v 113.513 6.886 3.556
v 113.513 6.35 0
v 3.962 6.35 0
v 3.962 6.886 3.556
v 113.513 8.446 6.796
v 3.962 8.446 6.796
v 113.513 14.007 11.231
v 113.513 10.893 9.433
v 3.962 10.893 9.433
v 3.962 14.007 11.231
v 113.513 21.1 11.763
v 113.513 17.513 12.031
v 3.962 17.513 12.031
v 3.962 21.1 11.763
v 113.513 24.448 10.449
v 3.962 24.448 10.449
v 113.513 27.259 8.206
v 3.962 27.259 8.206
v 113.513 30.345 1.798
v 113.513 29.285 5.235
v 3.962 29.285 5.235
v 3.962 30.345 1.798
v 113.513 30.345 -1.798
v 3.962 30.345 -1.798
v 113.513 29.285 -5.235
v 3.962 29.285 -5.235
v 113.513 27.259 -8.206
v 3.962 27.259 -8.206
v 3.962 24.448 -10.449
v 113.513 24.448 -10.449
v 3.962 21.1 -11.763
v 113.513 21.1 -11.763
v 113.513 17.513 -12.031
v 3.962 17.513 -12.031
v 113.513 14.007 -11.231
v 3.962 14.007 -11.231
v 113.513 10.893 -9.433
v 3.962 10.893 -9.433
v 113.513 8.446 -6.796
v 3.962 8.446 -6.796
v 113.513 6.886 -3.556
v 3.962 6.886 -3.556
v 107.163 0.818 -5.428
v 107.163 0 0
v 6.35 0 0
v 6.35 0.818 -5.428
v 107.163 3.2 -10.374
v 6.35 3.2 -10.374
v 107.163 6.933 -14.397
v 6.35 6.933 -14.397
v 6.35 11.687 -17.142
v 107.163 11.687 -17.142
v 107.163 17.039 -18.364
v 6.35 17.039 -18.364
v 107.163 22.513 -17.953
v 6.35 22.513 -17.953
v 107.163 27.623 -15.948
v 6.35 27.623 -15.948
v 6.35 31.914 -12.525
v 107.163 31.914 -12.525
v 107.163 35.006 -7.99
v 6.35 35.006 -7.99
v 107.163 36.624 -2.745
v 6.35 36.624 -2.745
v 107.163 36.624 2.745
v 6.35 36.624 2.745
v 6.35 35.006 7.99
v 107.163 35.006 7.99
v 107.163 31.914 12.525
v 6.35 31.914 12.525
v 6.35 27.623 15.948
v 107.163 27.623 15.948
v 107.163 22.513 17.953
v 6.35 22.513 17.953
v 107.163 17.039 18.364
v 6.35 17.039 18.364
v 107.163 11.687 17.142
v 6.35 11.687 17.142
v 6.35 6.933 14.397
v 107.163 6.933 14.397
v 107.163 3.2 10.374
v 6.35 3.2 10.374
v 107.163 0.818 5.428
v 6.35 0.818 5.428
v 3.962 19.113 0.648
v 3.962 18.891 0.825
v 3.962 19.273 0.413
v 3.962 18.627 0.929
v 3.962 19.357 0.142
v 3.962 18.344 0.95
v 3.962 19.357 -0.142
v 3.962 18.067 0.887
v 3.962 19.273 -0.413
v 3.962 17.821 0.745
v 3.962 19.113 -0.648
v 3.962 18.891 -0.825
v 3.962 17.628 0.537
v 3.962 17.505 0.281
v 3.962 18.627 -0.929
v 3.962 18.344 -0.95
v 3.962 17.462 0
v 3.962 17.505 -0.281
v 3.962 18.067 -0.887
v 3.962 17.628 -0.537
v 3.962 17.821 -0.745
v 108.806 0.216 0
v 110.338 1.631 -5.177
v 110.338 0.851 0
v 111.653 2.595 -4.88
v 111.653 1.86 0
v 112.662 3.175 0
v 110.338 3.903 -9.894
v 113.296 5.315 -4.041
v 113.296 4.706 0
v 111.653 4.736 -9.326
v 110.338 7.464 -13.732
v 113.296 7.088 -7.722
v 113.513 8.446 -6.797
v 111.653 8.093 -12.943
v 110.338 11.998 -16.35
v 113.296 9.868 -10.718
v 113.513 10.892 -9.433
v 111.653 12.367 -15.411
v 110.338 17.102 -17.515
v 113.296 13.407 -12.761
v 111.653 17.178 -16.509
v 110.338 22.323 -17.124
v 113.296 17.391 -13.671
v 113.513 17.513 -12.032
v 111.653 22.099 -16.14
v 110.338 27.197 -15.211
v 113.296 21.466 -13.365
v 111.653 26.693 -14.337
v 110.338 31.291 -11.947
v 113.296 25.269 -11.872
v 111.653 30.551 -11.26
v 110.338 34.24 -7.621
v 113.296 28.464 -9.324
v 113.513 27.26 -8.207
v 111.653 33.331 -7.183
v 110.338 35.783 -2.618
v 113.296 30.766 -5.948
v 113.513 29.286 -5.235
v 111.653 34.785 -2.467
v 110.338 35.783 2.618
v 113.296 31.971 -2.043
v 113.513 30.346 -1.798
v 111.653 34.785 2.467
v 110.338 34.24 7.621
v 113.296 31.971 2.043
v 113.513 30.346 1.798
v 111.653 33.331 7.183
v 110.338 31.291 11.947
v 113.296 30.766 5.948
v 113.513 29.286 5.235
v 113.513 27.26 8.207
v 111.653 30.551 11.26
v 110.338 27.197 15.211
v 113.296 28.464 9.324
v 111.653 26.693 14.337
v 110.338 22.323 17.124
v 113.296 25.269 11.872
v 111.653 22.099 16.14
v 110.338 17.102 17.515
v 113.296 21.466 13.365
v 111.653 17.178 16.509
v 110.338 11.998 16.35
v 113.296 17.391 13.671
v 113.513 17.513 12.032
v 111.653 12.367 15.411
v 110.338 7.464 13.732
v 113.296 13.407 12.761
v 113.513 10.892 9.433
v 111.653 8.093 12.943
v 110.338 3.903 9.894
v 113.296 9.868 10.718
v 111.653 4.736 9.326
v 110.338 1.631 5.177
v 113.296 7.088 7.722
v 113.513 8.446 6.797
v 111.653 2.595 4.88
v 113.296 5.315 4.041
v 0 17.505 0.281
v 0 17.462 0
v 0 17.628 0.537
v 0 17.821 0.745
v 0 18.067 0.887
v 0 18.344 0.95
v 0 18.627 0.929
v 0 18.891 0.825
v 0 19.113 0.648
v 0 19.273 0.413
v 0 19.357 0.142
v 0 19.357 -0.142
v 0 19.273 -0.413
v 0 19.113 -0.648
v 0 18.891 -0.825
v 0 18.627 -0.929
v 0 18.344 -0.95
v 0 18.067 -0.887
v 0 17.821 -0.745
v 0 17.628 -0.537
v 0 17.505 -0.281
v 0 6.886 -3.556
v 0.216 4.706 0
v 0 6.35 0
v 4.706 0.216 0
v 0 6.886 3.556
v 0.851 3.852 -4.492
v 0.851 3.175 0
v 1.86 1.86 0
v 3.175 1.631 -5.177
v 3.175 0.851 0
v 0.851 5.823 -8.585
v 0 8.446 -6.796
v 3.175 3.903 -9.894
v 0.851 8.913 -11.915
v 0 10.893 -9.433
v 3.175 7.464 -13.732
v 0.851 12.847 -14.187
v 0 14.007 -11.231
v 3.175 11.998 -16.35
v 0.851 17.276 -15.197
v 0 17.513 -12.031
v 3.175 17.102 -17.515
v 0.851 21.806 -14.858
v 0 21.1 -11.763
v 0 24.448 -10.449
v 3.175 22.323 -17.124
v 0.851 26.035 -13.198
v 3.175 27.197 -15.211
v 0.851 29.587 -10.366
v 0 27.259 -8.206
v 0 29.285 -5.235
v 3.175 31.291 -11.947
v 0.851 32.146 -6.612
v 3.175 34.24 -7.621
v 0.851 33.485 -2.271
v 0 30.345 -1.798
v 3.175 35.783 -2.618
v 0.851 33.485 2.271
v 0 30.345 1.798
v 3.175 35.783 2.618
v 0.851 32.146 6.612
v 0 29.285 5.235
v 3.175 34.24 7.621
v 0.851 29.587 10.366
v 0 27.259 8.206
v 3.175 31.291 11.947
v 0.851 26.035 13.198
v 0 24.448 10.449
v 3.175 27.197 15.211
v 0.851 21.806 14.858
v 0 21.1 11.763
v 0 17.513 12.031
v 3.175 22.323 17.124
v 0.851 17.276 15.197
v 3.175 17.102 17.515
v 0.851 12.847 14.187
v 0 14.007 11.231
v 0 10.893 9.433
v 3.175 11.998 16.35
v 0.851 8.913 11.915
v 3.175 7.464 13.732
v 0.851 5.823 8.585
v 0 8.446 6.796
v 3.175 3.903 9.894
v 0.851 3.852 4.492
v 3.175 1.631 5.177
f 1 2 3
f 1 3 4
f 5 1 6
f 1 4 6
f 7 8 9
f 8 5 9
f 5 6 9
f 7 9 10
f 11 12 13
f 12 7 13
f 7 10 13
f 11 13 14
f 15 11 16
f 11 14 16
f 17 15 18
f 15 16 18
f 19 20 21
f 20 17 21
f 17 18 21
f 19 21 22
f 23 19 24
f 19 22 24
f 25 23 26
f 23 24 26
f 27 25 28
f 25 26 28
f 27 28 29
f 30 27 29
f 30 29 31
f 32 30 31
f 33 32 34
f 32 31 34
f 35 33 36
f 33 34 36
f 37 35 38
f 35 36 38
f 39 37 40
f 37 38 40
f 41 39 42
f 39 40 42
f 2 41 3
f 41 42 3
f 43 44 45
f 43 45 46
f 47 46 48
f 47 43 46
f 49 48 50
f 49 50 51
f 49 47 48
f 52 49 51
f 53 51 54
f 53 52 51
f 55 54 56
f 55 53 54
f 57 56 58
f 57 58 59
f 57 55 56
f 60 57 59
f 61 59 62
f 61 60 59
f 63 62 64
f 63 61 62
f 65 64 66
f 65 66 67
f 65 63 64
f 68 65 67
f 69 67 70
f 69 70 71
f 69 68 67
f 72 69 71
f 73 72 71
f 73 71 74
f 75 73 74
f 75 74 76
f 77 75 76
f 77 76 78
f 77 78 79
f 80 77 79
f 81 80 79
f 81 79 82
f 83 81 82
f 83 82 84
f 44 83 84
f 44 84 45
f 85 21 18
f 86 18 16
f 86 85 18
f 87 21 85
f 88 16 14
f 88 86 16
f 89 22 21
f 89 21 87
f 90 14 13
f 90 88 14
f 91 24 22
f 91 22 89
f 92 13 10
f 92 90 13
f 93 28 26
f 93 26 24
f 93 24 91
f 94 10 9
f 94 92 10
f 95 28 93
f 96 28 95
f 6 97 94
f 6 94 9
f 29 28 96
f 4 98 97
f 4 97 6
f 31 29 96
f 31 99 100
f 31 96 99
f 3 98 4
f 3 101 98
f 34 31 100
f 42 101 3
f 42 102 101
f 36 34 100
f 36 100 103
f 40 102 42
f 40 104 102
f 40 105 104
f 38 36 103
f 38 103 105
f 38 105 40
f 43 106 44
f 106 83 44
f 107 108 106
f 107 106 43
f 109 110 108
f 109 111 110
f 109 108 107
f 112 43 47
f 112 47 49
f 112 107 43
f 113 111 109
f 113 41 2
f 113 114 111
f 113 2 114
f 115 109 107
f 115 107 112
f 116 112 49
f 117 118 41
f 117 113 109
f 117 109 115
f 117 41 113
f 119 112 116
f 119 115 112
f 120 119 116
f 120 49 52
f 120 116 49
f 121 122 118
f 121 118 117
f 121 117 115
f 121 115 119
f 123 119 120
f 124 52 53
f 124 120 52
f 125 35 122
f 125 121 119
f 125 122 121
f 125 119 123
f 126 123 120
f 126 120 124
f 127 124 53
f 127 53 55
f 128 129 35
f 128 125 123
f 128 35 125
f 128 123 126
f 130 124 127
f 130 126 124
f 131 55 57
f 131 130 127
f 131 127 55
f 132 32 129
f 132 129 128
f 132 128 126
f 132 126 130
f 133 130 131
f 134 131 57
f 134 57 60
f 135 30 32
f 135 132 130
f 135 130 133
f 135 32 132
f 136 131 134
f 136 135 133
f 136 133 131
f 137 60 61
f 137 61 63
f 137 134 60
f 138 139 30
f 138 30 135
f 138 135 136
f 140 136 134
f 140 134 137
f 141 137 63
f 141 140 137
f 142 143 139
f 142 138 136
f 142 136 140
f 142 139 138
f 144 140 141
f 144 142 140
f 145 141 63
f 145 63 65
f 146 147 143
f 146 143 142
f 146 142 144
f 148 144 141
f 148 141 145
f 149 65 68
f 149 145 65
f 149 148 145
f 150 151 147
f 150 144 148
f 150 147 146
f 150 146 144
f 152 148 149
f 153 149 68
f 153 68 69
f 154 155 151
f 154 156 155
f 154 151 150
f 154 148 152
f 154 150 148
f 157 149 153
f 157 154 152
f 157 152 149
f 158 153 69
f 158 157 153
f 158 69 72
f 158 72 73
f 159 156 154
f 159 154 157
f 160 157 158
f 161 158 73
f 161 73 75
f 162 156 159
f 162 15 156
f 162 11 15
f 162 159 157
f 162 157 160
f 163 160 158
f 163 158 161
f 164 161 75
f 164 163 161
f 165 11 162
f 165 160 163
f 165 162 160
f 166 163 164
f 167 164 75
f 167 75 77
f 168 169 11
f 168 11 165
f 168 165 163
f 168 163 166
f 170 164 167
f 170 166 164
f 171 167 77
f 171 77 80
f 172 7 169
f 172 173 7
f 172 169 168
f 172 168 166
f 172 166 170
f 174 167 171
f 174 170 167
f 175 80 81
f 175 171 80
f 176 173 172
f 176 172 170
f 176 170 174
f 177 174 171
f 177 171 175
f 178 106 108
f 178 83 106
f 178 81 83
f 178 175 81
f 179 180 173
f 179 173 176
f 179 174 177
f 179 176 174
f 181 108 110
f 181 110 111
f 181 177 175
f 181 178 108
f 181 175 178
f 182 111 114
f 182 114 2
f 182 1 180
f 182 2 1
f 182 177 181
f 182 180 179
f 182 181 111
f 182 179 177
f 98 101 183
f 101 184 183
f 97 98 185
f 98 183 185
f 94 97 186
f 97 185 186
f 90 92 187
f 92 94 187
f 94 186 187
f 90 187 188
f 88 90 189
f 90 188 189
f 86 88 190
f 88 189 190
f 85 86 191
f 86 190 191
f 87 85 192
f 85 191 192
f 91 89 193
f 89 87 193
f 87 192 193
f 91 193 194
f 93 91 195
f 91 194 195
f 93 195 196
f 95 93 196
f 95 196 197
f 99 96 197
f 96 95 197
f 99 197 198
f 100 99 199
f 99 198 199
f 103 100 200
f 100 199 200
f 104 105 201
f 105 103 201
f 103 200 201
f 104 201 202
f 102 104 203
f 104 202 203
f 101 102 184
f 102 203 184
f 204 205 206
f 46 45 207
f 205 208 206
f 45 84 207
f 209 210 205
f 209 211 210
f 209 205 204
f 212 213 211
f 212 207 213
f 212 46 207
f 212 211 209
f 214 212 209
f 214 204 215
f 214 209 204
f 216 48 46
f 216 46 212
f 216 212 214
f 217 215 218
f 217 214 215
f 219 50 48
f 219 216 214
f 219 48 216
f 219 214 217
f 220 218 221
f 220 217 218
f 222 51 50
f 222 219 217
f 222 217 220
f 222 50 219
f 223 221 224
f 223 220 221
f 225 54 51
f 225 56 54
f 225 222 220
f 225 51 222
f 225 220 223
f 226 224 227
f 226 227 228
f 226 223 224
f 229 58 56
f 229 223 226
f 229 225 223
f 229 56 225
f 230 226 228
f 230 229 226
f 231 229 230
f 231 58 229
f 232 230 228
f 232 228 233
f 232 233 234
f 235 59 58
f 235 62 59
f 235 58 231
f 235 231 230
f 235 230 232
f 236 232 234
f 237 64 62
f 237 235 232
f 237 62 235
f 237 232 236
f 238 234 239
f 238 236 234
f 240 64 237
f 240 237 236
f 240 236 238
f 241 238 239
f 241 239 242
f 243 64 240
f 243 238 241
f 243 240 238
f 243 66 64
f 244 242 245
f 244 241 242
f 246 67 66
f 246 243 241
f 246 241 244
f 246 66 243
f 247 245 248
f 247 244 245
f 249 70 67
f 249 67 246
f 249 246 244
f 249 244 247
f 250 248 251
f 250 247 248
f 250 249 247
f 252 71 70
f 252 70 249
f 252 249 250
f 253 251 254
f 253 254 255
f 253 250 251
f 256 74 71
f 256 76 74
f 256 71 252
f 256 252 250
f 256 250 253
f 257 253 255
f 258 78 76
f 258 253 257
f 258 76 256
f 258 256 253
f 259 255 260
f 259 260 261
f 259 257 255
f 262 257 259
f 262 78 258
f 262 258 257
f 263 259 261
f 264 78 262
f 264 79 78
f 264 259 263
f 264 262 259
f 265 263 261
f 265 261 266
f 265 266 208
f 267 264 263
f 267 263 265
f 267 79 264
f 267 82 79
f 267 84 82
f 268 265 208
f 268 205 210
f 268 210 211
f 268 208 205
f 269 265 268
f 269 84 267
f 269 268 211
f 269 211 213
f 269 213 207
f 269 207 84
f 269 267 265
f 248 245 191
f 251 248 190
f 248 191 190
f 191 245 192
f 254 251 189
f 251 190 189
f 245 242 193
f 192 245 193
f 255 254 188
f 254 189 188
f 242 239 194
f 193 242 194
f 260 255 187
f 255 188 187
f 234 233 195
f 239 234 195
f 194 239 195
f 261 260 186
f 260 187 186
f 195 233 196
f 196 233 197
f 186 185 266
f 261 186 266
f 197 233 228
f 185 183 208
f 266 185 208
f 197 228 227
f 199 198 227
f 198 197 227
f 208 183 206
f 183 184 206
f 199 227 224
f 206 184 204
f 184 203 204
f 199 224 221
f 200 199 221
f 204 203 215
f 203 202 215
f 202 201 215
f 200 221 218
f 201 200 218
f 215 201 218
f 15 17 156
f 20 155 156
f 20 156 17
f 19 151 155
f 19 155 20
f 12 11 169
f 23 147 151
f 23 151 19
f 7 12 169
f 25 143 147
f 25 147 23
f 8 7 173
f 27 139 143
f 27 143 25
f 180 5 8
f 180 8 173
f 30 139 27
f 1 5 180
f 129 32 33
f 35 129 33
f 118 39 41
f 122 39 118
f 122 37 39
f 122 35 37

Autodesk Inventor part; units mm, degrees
ref_plane "YZ Plane" through (0, 0, 0) normal (1, 0, 0) x (0, 1, 0)
ref_plane "XZ Plane" through (0, 0, 0) normal (0, 1, 0) x (-1, 0, 0)
ref_plane "XY Plane" through (0, 0, 0) normal (0, 0, 1) x (1, 0, 0)
sketch "Sketch3" plane through (0, 0, 0) normal (0, 0, 1) x (1, 0, 0)
  line L0 (0, 0) -> (113.5126, 0)
  line L1 (113.5126, 0) -> (113.5126, 6.35)
  line L2 (113.5126, 6.35) -> (3.9624, 6.35)
  line L3 (3.9624, 6.35) -> (3.9624, 17.4625)
  line L4 (3.9624, 17.4625) -> (0, 17.4625)
  line L5 (0, 17.4625) -> (0, 0)
  line L6 (0, 17.4625) -> (0, 18.415) construction
  line L7 (0, 18.415) -> (113.5126, 18.415) construction
  line L8 (113.5126, 18.415) -> (113.5126, 0) construction
  dimension "d163" = 113.5126
  dimension "d164" = 6.35
  dimension "d165" = 109.5502
  dimension "d166" = 11.1125
  dimension "d167" = 0.9525
revolve "Revolution2" add sketch "Sketch3" angle 360 about axis through (0, 18.415, 0) along (1, 0, 0)
fillet "Fillet1" radius 6.35 1 edges at (0, 36.83, 0)
fillet "Fillet2" radius 6.35 1 edges at (113.5126, 36.83, 0)
properties part number "5.5 Sleeve Handle" material "Rubber"
